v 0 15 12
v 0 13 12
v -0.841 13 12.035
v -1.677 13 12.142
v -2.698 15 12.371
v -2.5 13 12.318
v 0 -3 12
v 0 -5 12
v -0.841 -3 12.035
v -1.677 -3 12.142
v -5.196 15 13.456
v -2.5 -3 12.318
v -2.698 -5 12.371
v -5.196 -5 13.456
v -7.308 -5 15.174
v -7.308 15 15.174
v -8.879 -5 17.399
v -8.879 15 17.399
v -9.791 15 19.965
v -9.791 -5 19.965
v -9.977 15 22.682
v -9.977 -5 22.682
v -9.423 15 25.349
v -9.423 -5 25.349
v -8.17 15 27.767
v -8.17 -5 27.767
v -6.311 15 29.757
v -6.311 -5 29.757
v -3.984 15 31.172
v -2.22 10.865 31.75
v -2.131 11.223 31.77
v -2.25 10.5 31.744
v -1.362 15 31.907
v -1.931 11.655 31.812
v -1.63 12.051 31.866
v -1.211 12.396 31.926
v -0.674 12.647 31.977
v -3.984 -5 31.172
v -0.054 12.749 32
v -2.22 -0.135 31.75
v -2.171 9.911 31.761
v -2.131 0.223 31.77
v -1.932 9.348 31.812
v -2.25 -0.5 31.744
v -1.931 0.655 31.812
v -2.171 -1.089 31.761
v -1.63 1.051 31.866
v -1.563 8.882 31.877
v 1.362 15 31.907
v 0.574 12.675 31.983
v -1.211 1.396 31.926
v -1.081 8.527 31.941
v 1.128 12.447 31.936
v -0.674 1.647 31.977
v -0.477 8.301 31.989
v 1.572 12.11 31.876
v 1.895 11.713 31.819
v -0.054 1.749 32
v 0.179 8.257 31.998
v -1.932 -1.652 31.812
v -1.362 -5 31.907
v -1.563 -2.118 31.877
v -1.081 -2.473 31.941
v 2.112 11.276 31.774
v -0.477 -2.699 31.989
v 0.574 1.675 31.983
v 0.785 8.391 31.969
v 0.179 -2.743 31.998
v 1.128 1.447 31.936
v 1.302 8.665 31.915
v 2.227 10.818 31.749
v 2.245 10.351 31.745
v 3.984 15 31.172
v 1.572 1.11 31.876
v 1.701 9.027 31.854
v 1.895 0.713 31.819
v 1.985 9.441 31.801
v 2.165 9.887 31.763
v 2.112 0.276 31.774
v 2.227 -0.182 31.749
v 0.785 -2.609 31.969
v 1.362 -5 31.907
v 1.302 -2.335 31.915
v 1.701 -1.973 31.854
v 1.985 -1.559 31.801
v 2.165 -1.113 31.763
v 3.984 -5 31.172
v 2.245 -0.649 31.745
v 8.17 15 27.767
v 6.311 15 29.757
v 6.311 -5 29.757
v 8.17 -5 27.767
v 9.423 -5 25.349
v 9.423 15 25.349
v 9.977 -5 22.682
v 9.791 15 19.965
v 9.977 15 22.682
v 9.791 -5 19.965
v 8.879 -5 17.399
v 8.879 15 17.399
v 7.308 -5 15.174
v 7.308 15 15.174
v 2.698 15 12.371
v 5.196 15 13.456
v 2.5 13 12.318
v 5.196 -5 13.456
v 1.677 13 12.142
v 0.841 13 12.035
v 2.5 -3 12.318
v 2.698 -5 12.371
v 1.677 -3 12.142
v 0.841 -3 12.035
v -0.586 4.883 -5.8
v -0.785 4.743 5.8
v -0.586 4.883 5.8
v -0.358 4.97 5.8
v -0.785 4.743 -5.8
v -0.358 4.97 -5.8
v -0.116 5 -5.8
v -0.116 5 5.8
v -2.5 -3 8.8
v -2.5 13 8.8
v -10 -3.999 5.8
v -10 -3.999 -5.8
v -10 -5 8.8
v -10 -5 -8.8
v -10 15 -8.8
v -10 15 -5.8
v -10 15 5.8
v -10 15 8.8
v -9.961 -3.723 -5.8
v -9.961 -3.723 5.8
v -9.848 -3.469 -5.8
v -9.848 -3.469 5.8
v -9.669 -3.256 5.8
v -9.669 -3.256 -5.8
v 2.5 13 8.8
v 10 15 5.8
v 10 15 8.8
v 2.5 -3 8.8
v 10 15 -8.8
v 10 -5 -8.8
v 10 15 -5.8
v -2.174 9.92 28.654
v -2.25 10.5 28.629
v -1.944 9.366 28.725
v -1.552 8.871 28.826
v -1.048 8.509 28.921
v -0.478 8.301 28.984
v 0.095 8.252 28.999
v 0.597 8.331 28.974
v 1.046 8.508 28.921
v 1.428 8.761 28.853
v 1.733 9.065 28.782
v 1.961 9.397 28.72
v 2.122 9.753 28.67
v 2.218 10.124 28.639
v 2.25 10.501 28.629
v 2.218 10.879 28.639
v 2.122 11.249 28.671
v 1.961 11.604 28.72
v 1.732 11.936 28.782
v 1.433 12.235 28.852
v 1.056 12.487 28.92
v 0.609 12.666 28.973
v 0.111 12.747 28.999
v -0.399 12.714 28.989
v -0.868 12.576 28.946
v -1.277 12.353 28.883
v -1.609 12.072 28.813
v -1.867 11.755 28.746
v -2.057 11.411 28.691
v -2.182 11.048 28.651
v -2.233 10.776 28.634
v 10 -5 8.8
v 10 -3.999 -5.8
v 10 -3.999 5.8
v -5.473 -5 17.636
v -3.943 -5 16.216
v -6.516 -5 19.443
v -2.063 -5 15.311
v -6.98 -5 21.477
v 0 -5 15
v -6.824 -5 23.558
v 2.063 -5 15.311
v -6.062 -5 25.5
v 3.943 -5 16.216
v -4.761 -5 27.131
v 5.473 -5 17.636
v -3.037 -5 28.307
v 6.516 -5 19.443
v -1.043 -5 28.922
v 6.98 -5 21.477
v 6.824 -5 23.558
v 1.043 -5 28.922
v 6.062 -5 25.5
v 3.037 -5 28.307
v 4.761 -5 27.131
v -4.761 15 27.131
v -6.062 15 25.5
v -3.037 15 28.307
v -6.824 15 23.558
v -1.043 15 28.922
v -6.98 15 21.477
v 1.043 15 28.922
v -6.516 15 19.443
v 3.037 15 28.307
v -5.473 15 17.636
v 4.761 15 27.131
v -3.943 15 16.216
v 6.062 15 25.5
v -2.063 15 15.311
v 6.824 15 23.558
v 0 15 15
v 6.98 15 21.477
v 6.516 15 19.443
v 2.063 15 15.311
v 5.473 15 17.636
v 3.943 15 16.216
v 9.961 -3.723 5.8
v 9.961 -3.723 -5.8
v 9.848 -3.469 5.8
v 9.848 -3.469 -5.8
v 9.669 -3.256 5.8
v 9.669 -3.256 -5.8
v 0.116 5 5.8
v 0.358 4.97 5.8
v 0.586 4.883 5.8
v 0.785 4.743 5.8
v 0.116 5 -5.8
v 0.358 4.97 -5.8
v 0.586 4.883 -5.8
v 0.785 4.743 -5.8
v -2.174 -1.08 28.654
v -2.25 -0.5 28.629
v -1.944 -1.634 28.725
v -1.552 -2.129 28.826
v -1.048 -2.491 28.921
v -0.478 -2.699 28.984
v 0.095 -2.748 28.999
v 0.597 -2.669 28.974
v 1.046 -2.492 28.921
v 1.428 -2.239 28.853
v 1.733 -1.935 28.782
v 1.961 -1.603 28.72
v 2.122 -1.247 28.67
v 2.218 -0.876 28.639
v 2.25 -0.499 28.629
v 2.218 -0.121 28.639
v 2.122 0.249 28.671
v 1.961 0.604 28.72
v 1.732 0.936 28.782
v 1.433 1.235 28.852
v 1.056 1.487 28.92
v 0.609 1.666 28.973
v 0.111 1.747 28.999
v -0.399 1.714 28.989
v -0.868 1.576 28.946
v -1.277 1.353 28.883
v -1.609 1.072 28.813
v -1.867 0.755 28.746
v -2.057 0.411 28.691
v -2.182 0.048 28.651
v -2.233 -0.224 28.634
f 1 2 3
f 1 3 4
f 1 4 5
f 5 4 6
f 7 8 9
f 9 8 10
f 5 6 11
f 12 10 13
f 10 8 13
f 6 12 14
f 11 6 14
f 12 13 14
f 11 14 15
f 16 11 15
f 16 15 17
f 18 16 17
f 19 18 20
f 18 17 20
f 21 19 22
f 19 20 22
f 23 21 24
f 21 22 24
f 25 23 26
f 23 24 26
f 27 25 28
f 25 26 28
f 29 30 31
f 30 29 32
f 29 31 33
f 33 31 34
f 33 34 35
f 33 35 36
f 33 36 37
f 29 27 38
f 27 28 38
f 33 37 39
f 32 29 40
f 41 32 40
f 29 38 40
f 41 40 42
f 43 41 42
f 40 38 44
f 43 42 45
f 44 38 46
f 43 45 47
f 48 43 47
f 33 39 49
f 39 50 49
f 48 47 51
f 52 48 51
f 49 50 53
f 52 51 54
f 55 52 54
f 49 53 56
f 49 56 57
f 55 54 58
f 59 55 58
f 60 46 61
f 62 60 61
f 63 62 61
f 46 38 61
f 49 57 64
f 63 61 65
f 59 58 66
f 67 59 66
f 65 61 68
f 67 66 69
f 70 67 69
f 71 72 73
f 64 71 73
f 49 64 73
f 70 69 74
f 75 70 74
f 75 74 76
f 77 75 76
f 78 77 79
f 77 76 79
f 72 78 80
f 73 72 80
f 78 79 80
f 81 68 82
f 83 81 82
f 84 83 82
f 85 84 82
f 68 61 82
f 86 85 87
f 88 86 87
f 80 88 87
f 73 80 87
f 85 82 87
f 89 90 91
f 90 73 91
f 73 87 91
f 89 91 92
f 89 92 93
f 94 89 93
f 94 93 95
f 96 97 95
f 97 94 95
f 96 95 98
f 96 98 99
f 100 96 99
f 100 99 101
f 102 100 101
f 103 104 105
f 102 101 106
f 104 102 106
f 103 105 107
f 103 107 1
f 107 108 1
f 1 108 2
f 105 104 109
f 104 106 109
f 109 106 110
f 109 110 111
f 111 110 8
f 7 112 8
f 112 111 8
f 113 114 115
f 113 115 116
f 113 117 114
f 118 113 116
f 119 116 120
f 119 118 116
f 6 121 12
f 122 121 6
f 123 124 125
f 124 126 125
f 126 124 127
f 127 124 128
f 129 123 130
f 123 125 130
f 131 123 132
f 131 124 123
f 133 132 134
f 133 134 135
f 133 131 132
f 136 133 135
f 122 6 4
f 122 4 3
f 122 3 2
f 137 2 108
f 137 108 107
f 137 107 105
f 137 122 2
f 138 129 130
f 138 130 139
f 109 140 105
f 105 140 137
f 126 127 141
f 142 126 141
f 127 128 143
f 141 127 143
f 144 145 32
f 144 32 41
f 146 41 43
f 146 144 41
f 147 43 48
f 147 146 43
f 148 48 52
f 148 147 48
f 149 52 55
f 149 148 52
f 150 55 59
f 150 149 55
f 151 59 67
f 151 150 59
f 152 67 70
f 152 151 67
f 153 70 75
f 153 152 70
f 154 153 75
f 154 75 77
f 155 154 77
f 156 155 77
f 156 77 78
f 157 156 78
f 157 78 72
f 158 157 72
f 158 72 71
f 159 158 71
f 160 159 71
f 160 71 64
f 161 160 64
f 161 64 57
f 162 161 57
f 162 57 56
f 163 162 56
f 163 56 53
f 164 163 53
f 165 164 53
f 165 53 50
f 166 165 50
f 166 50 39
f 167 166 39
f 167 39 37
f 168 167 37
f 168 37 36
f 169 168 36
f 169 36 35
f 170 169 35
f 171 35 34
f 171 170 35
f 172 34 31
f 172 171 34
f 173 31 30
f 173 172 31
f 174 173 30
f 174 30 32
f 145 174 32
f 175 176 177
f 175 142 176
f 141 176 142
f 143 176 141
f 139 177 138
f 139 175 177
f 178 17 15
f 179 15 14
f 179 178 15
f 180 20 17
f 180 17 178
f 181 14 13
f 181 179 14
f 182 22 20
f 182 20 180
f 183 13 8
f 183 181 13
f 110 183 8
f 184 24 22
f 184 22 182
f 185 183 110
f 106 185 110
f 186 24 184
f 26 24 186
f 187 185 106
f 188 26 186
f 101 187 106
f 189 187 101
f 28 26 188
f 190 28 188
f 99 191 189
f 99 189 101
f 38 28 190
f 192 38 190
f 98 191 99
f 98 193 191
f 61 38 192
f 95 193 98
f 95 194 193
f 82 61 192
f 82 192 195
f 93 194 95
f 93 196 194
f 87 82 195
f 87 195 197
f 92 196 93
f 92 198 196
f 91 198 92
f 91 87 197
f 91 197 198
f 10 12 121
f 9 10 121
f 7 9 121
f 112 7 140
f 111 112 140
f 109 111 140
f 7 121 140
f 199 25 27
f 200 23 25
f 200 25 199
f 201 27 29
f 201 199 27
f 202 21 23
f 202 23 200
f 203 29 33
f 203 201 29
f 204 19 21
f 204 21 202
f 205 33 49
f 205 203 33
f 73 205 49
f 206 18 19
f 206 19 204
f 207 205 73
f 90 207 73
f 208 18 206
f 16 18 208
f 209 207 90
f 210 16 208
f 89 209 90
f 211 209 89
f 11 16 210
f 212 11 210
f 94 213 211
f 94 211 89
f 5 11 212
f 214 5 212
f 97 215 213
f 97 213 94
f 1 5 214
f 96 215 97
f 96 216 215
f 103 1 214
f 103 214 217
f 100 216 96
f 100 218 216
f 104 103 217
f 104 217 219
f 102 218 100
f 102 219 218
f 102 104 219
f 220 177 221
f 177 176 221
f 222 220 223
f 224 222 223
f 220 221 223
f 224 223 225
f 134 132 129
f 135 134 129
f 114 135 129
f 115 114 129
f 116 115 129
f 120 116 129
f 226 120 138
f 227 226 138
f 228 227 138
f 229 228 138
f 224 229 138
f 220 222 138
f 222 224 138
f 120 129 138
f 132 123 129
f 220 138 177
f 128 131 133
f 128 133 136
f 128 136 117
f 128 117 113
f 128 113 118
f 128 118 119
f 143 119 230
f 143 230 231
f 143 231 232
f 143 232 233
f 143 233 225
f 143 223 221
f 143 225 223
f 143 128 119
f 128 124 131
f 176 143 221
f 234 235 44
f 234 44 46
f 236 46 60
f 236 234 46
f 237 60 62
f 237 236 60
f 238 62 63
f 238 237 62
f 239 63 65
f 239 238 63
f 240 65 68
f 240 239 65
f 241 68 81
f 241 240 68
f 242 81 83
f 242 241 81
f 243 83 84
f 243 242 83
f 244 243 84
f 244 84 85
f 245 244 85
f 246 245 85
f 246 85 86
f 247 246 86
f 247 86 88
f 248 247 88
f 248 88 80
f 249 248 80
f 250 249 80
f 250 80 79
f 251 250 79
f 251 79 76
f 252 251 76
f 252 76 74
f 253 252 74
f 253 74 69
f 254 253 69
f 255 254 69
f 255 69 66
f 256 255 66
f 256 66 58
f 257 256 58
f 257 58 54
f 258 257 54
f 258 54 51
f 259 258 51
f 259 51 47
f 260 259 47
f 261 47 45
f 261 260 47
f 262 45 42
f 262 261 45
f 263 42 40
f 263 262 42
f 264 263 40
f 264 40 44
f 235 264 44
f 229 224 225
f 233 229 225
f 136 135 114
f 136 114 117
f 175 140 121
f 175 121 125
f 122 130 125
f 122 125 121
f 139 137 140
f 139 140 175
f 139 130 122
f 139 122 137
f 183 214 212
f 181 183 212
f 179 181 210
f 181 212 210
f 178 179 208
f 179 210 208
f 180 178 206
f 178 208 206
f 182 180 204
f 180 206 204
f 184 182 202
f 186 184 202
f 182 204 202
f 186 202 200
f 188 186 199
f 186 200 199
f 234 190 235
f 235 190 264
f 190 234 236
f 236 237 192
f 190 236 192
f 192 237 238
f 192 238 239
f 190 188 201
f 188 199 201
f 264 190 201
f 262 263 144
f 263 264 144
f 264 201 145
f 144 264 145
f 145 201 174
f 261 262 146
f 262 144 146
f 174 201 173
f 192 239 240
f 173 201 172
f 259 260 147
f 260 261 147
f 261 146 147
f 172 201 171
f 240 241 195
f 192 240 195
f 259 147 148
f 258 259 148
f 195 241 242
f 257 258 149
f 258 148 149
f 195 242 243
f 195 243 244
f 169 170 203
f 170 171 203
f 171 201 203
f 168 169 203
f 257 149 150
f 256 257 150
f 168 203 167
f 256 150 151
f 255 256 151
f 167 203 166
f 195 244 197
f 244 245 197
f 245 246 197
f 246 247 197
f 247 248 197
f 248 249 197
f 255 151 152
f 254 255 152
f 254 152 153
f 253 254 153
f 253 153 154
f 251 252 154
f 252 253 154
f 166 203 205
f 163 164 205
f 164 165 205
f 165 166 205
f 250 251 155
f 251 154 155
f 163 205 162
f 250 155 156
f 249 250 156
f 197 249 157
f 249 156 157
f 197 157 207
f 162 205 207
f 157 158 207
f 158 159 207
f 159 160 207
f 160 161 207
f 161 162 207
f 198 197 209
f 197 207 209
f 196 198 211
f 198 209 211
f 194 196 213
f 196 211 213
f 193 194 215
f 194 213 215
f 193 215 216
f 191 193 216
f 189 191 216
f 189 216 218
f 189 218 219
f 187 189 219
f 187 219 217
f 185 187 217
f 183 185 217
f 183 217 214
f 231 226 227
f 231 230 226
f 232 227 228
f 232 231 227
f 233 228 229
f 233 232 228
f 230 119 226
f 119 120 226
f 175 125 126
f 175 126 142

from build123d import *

# Parameters (mm, degrees)
SKETCH2_W                       = 20
SKETCH2_H                       = 10
BOSS_EXTRUDE1_DEPTH             = 5.8
CHAMFER1_SIZE                   = 9.5
CHAMFER1_SIZE2                  = 8.553838421
FILLET3_R                       = 1
SKETCH3_W                       = 20
SKETCH3_H                       = 20
BOSS_EXTRUDE2_DEPTH             = 3
BOSS_EXTRUDE3_REACH             = 22.061
SKETCH6_R                       = 10
SKETCH6_R_2                     = 7
BOSS_EXTRUDE3_DIRECTION_2_REACH = 22.061
BOSS_EXTRUDE4_REACH             = 31.381
BOSS_EXTRUDE4_END_RADIUS        = 10
SKETCH5_W                       = 5
SKETCH5_H                       = 16
CUT_EXTRUDE1_REACH              = 35.977
CUT_EXTRUDE1_END_RADIUS         = 10
SKETCH7_R                       = 2.25


with BuildPart() as part:
    # Sketch2 → Boss-Extrude1 (new, symmetric)
    with BuildSketch(Plane.XY):
        Rectangle(SKETCH2_W, SKETCH2_H)
    extrude(amount=BOSS_EXTRUDE1_DEPTH, both=True)

    # Chamfer1
    chamfer1_edges = [part.edges().sort_by_distance(p)[0] for p in [
        (-10, 5, 0),
        (10, 5, 0),
    ]]
    chamfer1_side = [part.faces().sort_by_distance(p)[0] for p in [
        (0, 5, 0),
    ]]
    chamfer(chamfer1_edges, length=CHAMFER1_SIZE, length2=CHAMFER1_SIZE2, reference=chamfer1_side[0])

    # Fillet3
    fillet3_edges = [part.edges().sort_by_distance(p)[0] for p in [
        (-0.5, 5, 0),
        (0.5, 5, 0),
        (10, -3.553838421, 0),
        (-10, -3.553838421, 0),
    ]]
    fillet(fillet3_edges, radius=FILLET3_R)

    # Sketch3 → Boss-Extrude2 (add)
    with BuildSketch(Plane.XY.offset(5.8)):
        with Locations((0, 5)):
            Rectangle(SKETCH3_W, SKETCH3_H)
    boss_extrude2 = extrude(amount=BOSS_EXTRUDE2_DEPTH)

    # Mirror1: Boss-Extrude2 across plane
    add(boss_extrude2.mirror(Plane.XY))


with BuildPart() as body_2:

    # Boss-Extrude3: up to this face of the body (flat: up to its plane)
    boss_extrude3_end = Plane(part.part.faces().sort_by_distance((0, 15, 7.3))[0])
    # Sketch6 → Boss-Extrude3 (new, up to the picked face)
    with BuildSketch(Plane(origin=(0, 0, 0), x_dir=(1, 0, 0), z_dir=(0, 1, 0)), mode=Mode.PRIVATE) as boss_extrude3_sk1:
        with Locations(Location((0, -22, 0), (0, 0, 90))):
            Circle(SKETCH6_R)
        with Locations(Location((0, -22, 0), (0, 0, 90))):
            Circle(SKETCH6_R_2, mode=Mode.SUBTRACT)
    boss_extrude3_tool1 = split(extrude(boss_extrude3_sk1.sketch, amount=BOSS_EXTRUDE3_REACH, mode=Mode.PRIVATE), bisect_by=boss_extrude3_end, keep=Keep.BOTH, mode=Mode.PRIVATE)
    add(boss_extrude3_tool1.solids().sort_by(Axis((0, 0, 31.717157), (0, 1, 0)))[0])


    # Boss-Extrude3 direction 2: up to this face of the body (flat: up to its plane)
    boss_extrude3_direction_2_end = Plane(part.part.faces().sort_by_distance((0, -5, 0))[0])
    # Sketch6 → Boss-Extrude3 direction 2 (add, up to the picked face)
    with BuildSketch(Plane(origin=(0, 0, 0), x_dir=(1, 0, 0), z_dir=(0, 1, 0)), mode=Mode.PRIVATE) as boss_extrude3_direction_2_sk1:
        with Locations(Location((0, -22, 0), (0, 0, 90))):
            Circle(SKETCH6_R)
        with Locations(Location((0, -22, 0), (0, 0, 90))):
            Circle(SKETCH6_R_2, mode=Mode.SUBTRACT)
    boss_extrude3_direction_2_tool1 = split(extrude(boss_extrude3_direction_2_sk1.sketch, amount=-BOSS_EXTRUDE3_DIRECTION_2_REACH, mode=Mode.PRIVATE), bisect_by=boss_extrude3_direction_2_end, keep=Keep.BOTH, mode=Mode.PRIVATE)
    add(boss_extrude3_direction_2_tool1.solids().sort_by(Axis((0, 0, 31.717157), (0, -1, 0)))[0])


with BuildPart() as part_1:
    add(part.part)

    add(body_2.part)  # Boss-Extrude4 merges body 2
    # Boss-Extrude4: up to this cylinder (the profile starts outside it)
    boss_extrude4_end = Plane(origin=(0, 5, 22), z_dir=(0, -1, 0)) * Cylinder(BOSS_EXTRUDE4_END_RADIUS, 83.762, mode=Mode.PRIVATE)
    # Sketch5 → Boss-Extrude4 (add, up to the surface)
    with BuildSketch(Plane.XY.offset(8.8), mode=Mode.PRIVATE) as boss_extrude4_sk1:
        with Locations((0, 5)):
            Rectangle(SKETCH5_W, SKETCH5_H)
    boss_extrude4_tool1 = extrude(boss_extrude4_sk1.sketch, amount=BOSS_EXTRUDE4_REACH, mode=Mode.PRIVATE) - boss_extrude4_end
    add(boss_extrude4_tool1.solids().sort_by_distance((0, 5, 8.8))[0])

    # Cut-Extrude1: up to this cylinder (the profile starts inside it)
    cut_extrude1_end = Plane(origin=(0, 5, 22), z_dir=(0, -1, 0)) * Cylinder(CUT_EXTRUDE1_END_RADIUS, 103.954, mode=Mode.PRIVATE)
    # Sketch7 → Cut-Extrude1 (cut, up to the surface)
    with BuildSketch(Plane.XY.offset(20), mode=Mode.PRIVATE) as cut_extrude1_sk1:
        with Locations(Location((0, 10.5, 0), (0, 0, 180))):
            Circle(SKETCH7_R)
    cut_extrude1_tool1 = extrude(cut_extrude1_sk1.sketch, amount=CUT_EXTRUDE1_REACH, mode=Mode.PRIVATE) & cut_extrude1_end
    add(cut_extrude1_tool1.solids().sort_by_distance((0, 10.5, 20))[0], mode=Mode.SUBTRACT)
    # Sketch7 → Cut-Extrude1 (cut, up to the surface)
    with BuildSketch(Plane.XY.offset(20), mode=Mode.PRIVATE) as cut_extrude1_sk2:
        with Locations(Location((0, -0.5, 0), (0, 0, 180))):
            Circle(SKETCH7_R)
    cut_extrude1_tool2 = extrude(cut_extrude1_sk2.sketch, amount=CUT_EXTRUDE1_REACH, mode=Mode.PRIVATE) & cut_extrude1_end
    add(cut_extrude1_tool2.solids().sort_by_distance((0, -0.5, 20))[0], mode=Mode.SUBTRACT)


solid = part_1.part
